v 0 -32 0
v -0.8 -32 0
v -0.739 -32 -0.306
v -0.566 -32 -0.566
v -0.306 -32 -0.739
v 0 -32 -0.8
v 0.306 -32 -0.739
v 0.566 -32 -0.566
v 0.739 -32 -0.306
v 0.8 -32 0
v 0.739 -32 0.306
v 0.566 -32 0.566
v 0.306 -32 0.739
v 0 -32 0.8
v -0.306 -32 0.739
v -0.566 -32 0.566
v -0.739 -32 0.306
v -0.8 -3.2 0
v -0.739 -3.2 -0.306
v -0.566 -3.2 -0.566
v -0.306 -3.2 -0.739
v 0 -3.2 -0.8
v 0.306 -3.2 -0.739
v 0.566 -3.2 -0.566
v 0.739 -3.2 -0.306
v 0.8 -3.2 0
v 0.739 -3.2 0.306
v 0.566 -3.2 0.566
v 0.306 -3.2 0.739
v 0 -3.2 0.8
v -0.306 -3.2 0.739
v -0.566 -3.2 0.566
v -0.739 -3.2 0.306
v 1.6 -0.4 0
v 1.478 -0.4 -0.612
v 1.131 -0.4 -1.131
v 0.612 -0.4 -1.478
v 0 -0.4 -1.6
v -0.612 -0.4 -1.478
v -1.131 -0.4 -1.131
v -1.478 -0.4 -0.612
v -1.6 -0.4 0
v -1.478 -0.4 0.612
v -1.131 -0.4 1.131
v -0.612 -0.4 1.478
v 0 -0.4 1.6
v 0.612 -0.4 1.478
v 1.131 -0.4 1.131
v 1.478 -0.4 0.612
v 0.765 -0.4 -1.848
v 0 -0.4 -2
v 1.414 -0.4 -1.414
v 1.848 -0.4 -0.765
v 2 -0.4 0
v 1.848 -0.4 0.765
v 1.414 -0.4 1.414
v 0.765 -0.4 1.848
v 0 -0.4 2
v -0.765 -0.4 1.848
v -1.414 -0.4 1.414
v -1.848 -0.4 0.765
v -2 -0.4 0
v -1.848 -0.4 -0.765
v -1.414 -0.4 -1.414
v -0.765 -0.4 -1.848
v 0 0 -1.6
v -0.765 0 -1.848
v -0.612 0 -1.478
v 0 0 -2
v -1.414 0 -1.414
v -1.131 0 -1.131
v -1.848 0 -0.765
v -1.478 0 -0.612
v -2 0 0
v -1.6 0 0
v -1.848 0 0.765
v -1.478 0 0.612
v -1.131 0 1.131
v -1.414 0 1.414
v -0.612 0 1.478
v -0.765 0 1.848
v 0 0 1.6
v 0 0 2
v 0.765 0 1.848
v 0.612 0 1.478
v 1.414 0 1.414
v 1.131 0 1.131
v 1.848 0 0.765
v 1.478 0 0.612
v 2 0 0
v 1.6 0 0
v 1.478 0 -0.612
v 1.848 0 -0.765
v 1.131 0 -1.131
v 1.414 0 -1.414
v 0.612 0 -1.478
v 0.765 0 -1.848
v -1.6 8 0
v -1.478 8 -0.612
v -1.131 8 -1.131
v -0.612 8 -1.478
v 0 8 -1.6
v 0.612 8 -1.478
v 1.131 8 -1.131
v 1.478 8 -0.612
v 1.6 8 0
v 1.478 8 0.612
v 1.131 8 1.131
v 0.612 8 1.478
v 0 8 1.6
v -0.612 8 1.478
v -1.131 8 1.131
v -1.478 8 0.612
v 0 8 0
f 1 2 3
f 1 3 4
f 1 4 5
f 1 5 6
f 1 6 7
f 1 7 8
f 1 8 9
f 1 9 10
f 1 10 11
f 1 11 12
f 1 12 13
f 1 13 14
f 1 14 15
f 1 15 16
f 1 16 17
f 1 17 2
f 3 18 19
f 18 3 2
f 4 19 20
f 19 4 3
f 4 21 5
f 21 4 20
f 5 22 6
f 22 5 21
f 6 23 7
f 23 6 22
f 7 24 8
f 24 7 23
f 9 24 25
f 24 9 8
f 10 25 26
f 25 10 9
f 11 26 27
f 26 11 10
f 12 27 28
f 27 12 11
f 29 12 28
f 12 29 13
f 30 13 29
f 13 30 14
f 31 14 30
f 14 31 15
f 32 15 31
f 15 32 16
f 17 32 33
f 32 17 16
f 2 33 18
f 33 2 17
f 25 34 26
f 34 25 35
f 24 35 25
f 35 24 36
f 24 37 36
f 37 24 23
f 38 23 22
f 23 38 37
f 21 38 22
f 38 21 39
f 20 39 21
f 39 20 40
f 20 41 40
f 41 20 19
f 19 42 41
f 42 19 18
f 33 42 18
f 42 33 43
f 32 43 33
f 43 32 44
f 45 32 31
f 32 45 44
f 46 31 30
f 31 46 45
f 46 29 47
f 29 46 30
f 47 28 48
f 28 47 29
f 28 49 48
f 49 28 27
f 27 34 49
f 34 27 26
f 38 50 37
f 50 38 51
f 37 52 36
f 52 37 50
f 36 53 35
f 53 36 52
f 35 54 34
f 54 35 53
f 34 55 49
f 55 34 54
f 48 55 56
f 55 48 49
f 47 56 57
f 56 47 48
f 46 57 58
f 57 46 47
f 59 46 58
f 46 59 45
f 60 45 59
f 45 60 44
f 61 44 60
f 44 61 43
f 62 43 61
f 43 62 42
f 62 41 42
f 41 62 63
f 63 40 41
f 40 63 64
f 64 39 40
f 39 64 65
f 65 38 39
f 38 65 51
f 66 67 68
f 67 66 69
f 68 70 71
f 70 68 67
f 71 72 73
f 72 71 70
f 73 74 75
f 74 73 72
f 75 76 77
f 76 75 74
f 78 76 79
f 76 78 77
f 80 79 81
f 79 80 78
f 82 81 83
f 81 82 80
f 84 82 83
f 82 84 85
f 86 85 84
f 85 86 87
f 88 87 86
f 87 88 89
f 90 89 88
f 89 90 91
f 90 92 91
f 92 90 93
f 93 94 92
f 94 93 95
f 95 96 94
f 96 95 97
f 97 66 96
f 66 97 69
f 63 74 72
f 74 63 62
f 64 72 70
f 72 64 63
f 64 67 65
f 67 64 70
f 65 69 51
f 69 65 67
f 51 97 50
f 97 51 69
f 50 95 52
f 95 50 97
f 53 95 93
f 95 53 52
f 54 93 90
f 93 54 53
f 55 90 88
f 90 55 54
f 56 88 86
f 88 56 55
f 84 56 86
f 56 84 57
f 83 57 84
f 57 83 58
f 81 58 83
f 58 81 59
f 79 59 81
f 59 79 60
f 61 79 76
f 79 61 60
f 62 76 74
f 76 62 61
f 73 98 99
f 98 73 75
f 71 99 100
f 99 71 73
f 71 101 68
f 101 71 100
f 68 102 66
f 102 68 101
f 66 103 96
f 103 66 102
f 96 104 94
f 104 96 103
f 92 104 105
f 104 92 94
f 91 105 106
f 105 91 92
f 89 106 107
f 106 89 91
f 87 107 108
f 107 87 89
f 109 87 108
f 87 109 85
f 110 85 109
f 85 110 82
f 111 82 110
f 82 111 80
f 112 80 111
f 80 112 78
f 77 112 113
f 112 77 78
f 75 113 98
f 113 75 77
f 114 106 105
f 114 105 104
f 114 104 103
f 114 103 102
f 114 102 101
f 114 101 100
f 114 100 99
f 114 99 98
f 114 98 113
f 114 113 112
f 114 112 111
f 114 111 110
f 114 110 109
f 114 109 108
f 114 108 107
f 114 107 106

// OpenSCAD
// file: ../p/4-4ring4.scad
use <../lib.scad>
function ldraw_lib__4_4ring4() = [
// 0 Ring  4 x 1.0
// 0 Name: 4-4ring4.dat
// 0 Author: James Jessiman
// 0 !LDRAW_ORG Primitive UPDATE 2009-01
// 0 !LICENSE Licensed under CC BY 2.0 and CC BY 4.0 : see CAreadme.txt
// 
// 0 BFC CERTIFY CCW
  [0,"BFC","CERTIFY"],
  [0,"BFC","CCW"],
// 
// 0 !HISTORY 1998-12-15 [PTadmin] Official Update 1998-10
// 0 !HISTORY 2002-04-08 [BrickCaster] Modified for BFC compliance
// 0 !HISTORY 2002-04-25 [PTadmin] Official Update 2002-02
// 0 !HISTORY 2007-06-24 [PTadmin] Header formatted for Contributor Agreement
// 0 !HISTORY 2008-07-01 [PTadmin] Official Update 2008-01
// 0 !HISTORY 2008-08-26 [cwdee] Switch polygon winding and rename
// 0 !HISTORY 2009-05-02 [PTadmin] Official Update 2009-01
// 
// 
// 4 16 -1.9135 0 4.6195 -1.5308 0 3.6956 0 0 4 0 0 5
  [4,16,-1.9135,0,4.6195,-1.5308,0,3.6956,0,0,4,0,0,5],
// 4 16 -3.5355 0 3.5355 -2.8284 0 2.8284 -1.5308 0 3.6956 -1.9135 0 4.6195
  [4,16,-3.5355,0,3.5355,-2.8284,0,2.8284,-1.5308,0,3.6956,-1.9135,0,4.6195],
// 4 16 -4.6195 0 1.9135 -3.6956 0 1.5308 -2.8284 0 2.8284 -3.5355 0 3.5355
  [4,16,-4.6195,0,1.9135,-3.6956,0,1.5308,-2.8284,0,2.8284,-3.5355,0,3.5355],
// 4 16 -5 0 0 -4 0 0 -3.6956 0 1.5308 -4.6195 0 1.9135
  [4,16,-5,0,0,-4,0,0,-3.6956,0,1.5308,-4.6195,0,1.9135],
// 4 16 -4.6195 0 -1.9135 -3.6956 0 -1.5308 -4 0 0 -5 0 0
  [4,16,-4.6195,0,-1.9135,-3.6956,0,-1.5308,-4,0,0,-5,0,0],
// 4 16 -3.5355 0 -3.5355 -2.8284 0 -2.8284 -3.6956 0 -1.5308 -4.6195 0 -1.9135
  [4,16,-3.5355,0,-3.5355,-2.8284,0,-2.8284,-3.6956,0,-1.5308,-4.6195,0,-1.9135],
// 4 16 -1.9135 0 -4.6195 -1.5308 0 -3.6956 -2.8284 0 -2.8284 -3.5355 0 -3.5355
  [4,16,-1.9135,0,-4.6195,-1.5308,0,-3.6956,-2.8284,0,-2.8284,-3.5355,0,-3.5355],
// 4 16 0 0 -5 0 0 -4 -1.5308 0 -3.6956 -1.9135 0 -4.6195
  [4,16,0,0,-5,0,0,-4,-1.5308,0,-3.6956,-1.9135,0,-4.6195],
// 4 16 1.9135 0 -4.6195 1.5308 0 -3.6956 0 0 -4 0 0 -5
  [4,16,1.9135,0,-4.6195,1.5308,0,-3.6956,0,0,-4,0,0,-5],
// 4 16 3.5355 0 -3.5355 2.8284 0 -2.8284 1.5308 0 -3.6956 1.9135 0 -4.6195
  [4,16,3.5355,0,-3.5355,2.8284,0,-2.8284,1.5308,0,-3.6956,1.9135,0,-4.6195],
// 4 16 4.6195 0 -1.9135 3.6956 0 -1.5308 2.8284 0 -2.8284 3.5355 0 -3.5355
  [4,16,4.6195,0,-1.9135,3.6956,0,-1.5308,2.8284,0,-2.8284,3.5355,0,-3.5355],
// 4 16 5 0 0 4 0 0 3.6956 0 -1.5308 4.6195 0 -1.9135
  [4,16,5,0,0,4,0,0,3.6956,0,-1.5308,4.6195,0,-1.9135],
// 4 16 4.6195 0 1.9135 3.6956 0 1.5308 4 0 0 5 0 0
  [4,16,4.6195,0,1.9135,3.6956,0,1.5308,4,0,0,5,0,0],
// 4 16 3.5355 0 3.5355 2.8284 0 2.8284 3.6956 0 1.5308 4.6195 0 1.9135
  [4,16,3.5355,0,3.5355,2.8284,0,2.8284,3.6956,0,1.5308,4.6195,0,1.9135],
// 4 16 1.9135 0 4.6195 1.5308 0 3.6956 2.8284 0 2.8284 3.5355 0 3.5355
  [4,16,1.9135,0,4.6195,1.5308,0,3.6956,2.8284,0,2.8284,3.5355,0,3.5355],
// 4 16 0 0 5 0 0 4 1.5308 0 3.6956 1.9135 0 4.6195
  [4,16,0,0,5,0,0,4,1.5308,0,3.6956,1.9135,0,4.6195],
// 0
];
makepoly(ldraw_lib__4_4ring4(), line=0.2);
// file: ../p/4-4edge.scad
use <../lib.scad>
function ldraw_lib__4_4edge() = [
// 0 Circle 1.0
// 0 Name: 4-4edge.dat
// 0 Author: James Jessiman
// 0 !LDRAW_ORG Primitive UPDATE 2017-01
// 0 !LICENSE Licensed under CC BY 2.0 and CC BY 4.0 : see CAreadme.txt
// 
// 0 BFC CERTIFY CCW
  [0,"BFC","CERTIFY"],
  [0,"BFC","CCW"],
// 
// 0 !HISTORY 1998-12-15 [PTadmin] Official Update 1998-10
// 0 !HISTORY 2005-12-28 [PTadmin] Official Update 2005-01
// 0 !HISTORY 2007-06-24 [PTadmin] Header formatted for Contributor Agreement
// 0 !HISTORY 2008-07-01 [PTadmin] Official Update 2008-01
// 0 !HISTORY 2017-01-15 [Steffen] BFCed
// 0 !HISTORY 2017-12-30 [PTadmin] Official Update 2017-01
// 
// 
// 2 24 1 0 0 0.9239 0 0.3827
  [2,24,1,0,0,0.9239,0,0.3827],
// 2 24 0.9239 0 0.3827 0.7071 0 0.7071
  [2,24,0.9239,0,0.3827,0.7071,0,0.7071],
// 2 24 0.7071 0 0.7071 0.3827 0 0.9239
  [2,24,0.7071,0,0.7071,0.3827,0,0.9239],
// 2 24 0.3827 0 0.9239 0 0 1
  [2,24,0.3827,0,0.9239,0,0,1],
// 2 24 0 0 1 -0.3827 0 0.9239
  [2,24,0,0,1,-0.3827,0,0.9239],
// 2 24 -0.3827 0 0.9239 -0.7071 0 0.7071
  [2,24,-0.3827,0,0.9239,-0.7071,0,0.7071],
// 2 24 -0.7071 0 0.7071 -0.9239 0 0.3827
  [2,24,-0.7071,0,0.7071,-0.9239,0,0.3827],
// 2 24 -0.9239 0 0.3827 -1 0 -0
  [2,24,-0.9239,0,0.3827,-1,0,-0],
// 2 24 -1 0 -0 -0.9239 0 -0.3827
  [2,24,-1,0,-0,-0.9239,0,-0.3827],
// 2 24 -0.9239 0 -0.3827 -0.7071 0 -0.7071
  [2,24,-0.9239,0,-0.3827,-0.7071,0,-0.7071],
// 2 24 -0.7071 0 -0.7071 -0.3827 0 -0.9239
  [2,24,-0.7071,0,-0.7071,-0.3827,0,-0.9239],
// 2 24 -0.3827 0 -0.9239 0 0 -1
  [2,24,-0.3827,0,-0.9239,0,0,-1],
// 2 24 0 0 -1 0.3827 0 -0.9239
  [2,24,0,0,-1,0.3827,0,-0.9239],
// 2 24 0.3827 0 -0.9239 0.7071 0 -0.7071
  [2,24,0.3827,0,-0.9239,0.7071,0,-0.7071],
// 2 24 0.7071 0 -0.7071 0.9239 0 -0.3827
  [2,24,0.7071,0,-0.7071,0.9239,0,-0.3827],
// 2 24 0.9239 0 -0.3827 1 0 0
  [2,24,0.9239,0,-0.3827,1,0,0],
];
makepoly(ldraw_lib__4_4edge(), line=0.2);
// file: ../p/4-4disc.scad
use <../lib.scad>
function ldraw_lib__4_4disc() = [
// 0 Disc 1.0
// 0 Name: 4-4disc.dat
// 0 Author: James Jessiman
// 0 !LDRAW_ORG Primitive UPDATE 2002-02
// 0 !LICENSE Licensed under CC BY 2.0 and CC BY 4.0 : see CAreadme.txt
// 
// 0 BFC CERTIFY CCW
  [0,"BFC","CERTIFY"],
  [0,"BFC","CCW"],
// 
// 0 !HISTORY 1998-12-15 [PTadmin] Official Update 1998-10
// 0 !HISTORY 2002-03-23 [sbliss] Added BFC statement
// 0 !HISTORY 2002-04-25 [PTadmin] Official Update 2002-02
// 0 !HISTORY 2007-06-24 [PTadmin] Header formatted for Contributor Agreement
// 0 !HISTORY 2008-07-01 [PTadmin] Official Update 2008-01
// 
// 
// 3 16 0 0 0 1 0 0 0.9239 0 0.3827
  [3,16,0,0,0,1,0,0,0.9239,0,0.3827],
// 3 16 0 0 0 0.9239 0 0.3827 0.7071 0 0.7071
  [3,16,0,0,0,0.9239,0,0.3827,0.7071,0,0.7071],
// 3 16 0 0 0 0.7071 0 0.7071 0.3827 0 0.9239
  [3,16,0,0,0,0.7071,0,0.7071,0.3827,0,0.9239],
// 3 16 0 0 0 0.3827 0 0.9239 0 0 1
  [3,16,0,0,0,0.3827,0,0.9239,0,0,1],
// 3 16 0 0 0 0 0 1 -0.3827 0 0.9239
  [3,16,0,0,0,0,0,1,-0.3827,0,0.9239],
// 3 16 0 0 0 -0.3827 0 0.9239 -0.7071 0 0.7071
  [3,16,0,0,0,-0.3827,0,0.9239,-0.7071,0,0.7071],
// 3 16 0 0 0 -0.7071 0 0.7071 -0.9239 0 0.3827
  [3,16,0,0,0,-0.7071,0,0.7071,-0.9239,0,0.3827],
// 3 16 0 0 0 -0.9239 0 0.3827 -1 0 -0
  [3,16,0,0,0,-0.9239,0,0.3827,-1,0,-0],
// 3 16 0 0 0 -1 0 -0 -0.9239 0 -0.3827
  [3,16,0,0,0,-1,0,-0,-0.9239,0,-0.3827],
// 3 16 0 0 0 -0.9239 0 -0.3827 -0.7071 0 -0.7071
  [3,16,0,0,0,-0.9239,0,-0.3827,-0.7071,0,-0.7071],
// 3 16 0 0 0 -0.7071 0 -0.7071 -0.3827 0 -0.9239
  [3,16,0,0,0,-0.7071,0,-0.7071,-0.3827,0,-0.9239],
// 3 16 0 0 0 -0.3827 0 -0.9239 0 0 -1
  [3,16,0,0,0,-0.3827,0,-0.9239,0,0,-1],
// 3 16 0 0 0 0 0 -1 0.3827 0 -0.9239
  [3,16,0,0,0,0,0,-1,0.3827,0,-0.9239],
// 3 16 0 0 0 0.3827 0 -0.9239 0.7071 0 -0.7071
  [3,16,0,0,0,0.3827,0,-0.9239,0.7071,0,-0.7071],
// 3 16 0 0 0 0.7071 0 -0.7071 0.9239 0 -0.3827
  [3,16,0,0,0,0.7071,0,-0.7071,0.9239,0,-0.3827],
// 3 16 0 0 0 0.9239 0 -0.3827 1 0 0
  [3,16,0,0,0,0.9239,0,-0.3827,1,0,0],
// 0
];
makepoly(ldraw_lib__4_4disc(), line=0.2);
// file: ../p/4-4cyli.scad
use <../lib.scad>
function ldraw_lib__4_4cyli() = [
// 0 Cylinder 1.0
// 0 Name: 4-4cyli.dat
// 0 Author: James Jessiman
// 0 !LDRAW_ORG Primitive UPDATE 2005-01
// 0 !LICENSE Licensed under CC BY 2.0 and CC BY 4.0 : see CAreadme.txt
// 
// 0 BFC CERTIFY CCW
  [0,"BFC","CERTIFY"],
  [0,"BFC","CCW"],
// 
// 0 !HISTORY 1998-12-15 [PTadmin] Official Update 1998-10
// 0 !HISTORY 2002-03-23 [sbliss] Added BFC statement; merged headers from files in distributions LDraw 0.27 and Complete.
// 0 !HISTORY 2002-04-25 [PTadmin] Official Update 2002-02
// 0 !HISTORY 2004-12-14 [guyvivan] BFC CCW
// 0 !HISTORY 2005-12-28 [PTadmin] Official Update 2005-01
// 0 !HISTORY 2007-06-24 [PTadmin] Header formatted for Contributor Agreement
// 0 !HISTORY 2008-07-01 [PTadmin] Official Update 2008-01
// 
// 
// 4 16 1 1 0 0.9239 1 0.3827 0.9239 0 0.3827 1 0 0
  [4,16,1,1,0,0.9239,1,0.3827,0.9239,0,0.3827,1,0,0],
// 5 24 1 0 0 1 1 0 0.9239 0 0.3827 0.9239 0 -0.3827
  [5,24,1,0,0,1,1,0,0.9239,0,0.3827,0.9239,0,-0.3827],
// 4 16 0.9239 1 0.3827 0.7071 1 0.7071 0.7071 0 0.7071 0.9239 0 0.3827
  [4,16,0.9239,1,0.3827,0.7071,1,0.7071,0.7071,0,0.7071,0.9239,0,0.3827],
// 5 24 0.9239 0 0.3827 0.9239 1 0.3827 0.7071 0 0.7071 1 0 0
  [5,24,0.9239,0,0.3827,0.9239,1,0.3827,0.7071,0,0.7071,1,0,0],
// 4 16 0.7071 1 0.7071 0.3827 1 0.9239 0.3827 0 0.9239 0.7071 0 0.7071
  [4,16,0.7071,1,0.7071,0.3827,1,0.9239,0.3827,0,0.9239,0.7071,0,0.7071],
// 5 24 0.7071 0 0.7071 0.7071 1 0.7071 0.3827 0 0.9239 0.9239 0 0.3827
  [5,24,0.7071,0,0.7071,0.7071,1,0.7071,0.3827,0,0.9239,0.9239,0,0.3827],
// 4 16 0.3827 1 0.9239 0 1 1 0 0 1 0.3827 0 0.9239
  [4,16,0.3827,1,0.9239,0,1,1,0,0,1,0.3827,0,0.9239],
// 5 24 0.3827 0 0.9239 0.3827 1 0.9239 0 0 1 0.7071 0 0.7071
  [5,24,0.3827,0,0.9239,0.3827,1,0.9239,0,0,1,0.7071,0,0.7071],
// 4 16 0 1 1 -0.3827 1 0.9239 -0.3827 0 0.9239 0 0 1
  [4,16,0,1,1,-0.3827,1,0.9239,-0.3827,0,0.9239,0,0,1],
// 5 24 0 0 1 0 1 1 -0.3827 0 0.9239 0.3827 0 0.9239
  [5,24,0,0,1,0,1,1,-0.3827,0,0.9239,0.3827,0,0.9239],
// 4 16 -0.3827 1 0.9239 -0.7071 1 0.7071 -0.7071 0 0.7071 -0.3827 0 0.9239
  [4,16,-0.3827,1,0.9239,-0.7071,1,0.7071,-0.7071,0,0.7071,-0.3827,0,0.9239],
// 5 24 -0.3827 0 0.9239 -0.3827 1 0.9239 -0.7071 0 0.7071 0 0 1
  [5,24,-0.3827,0,0.9239,-0.3827,1,0.9239,-0.7071,0,0.7071,0,0,1],
// 4 16 -0.7071 1 0.7071 -0.9239 1 0.3827 -0.9239 0 0.3827 -0.7071 0 0.7071
  [4,16,-0.7071,1,0.7071,-0.9239,1,0.3827,-0.9239,0,0.3827,-0.7071,0,0.7071],
// 5 24 -0.7071 0 0.7071 -0.7071 1 0.7071 -0.9239 0 0.3827 -0.3827 0 0.9239
  [5,24,-0.7071,0,0.7071,-0.7071,1,0.7071,-0.9239,0,0.3827,-0.3827,0,0.9239],
// 4 16 -0.9239 1 0.3827 -1 1 0 -1 0 0 -0.9239 0 0.3827
  [4,16,-0.9239,1,0.3827,-1,1,0,-1,0,0,-0.9239,0,0.3827],
// 5 24 -0.9239 0 0.3827 -0.9239 1 0.3827 -1 0 0 -0.7071 0 0.7071
  [5,24,-0.9239,0,0.3827,-0.9239,1,0.3827,-1,0,0,-0.7071,0,0.7071],
// 4 16 -1 1 0 -0.9239 1 -0.3827 -0.9239 0 -0.3827 -1 0 0
  [4,16,-1,1,0,-0.9239,1,-0.3827,-0.9239,0,-0.3827,-1,0,0],
// 5 24 -1 0 0 -1 1 0 -0.9239 0 -0.3827 -0.9239 0 0.3827
  [5,24,-1,0,0,-1,1,0,-0.9239,0,-0.3827,-0.9239,0,0.3827],
// 4 16 -0.9239 1 -0.3827 -0.7071 1 -0.7071 -0.7071 0 -0.7071 -0.9239 0 -0.3827
  [4,16,-0.9239,1,-0.3827,-0.7071,1,-0.7071,-0.7071,0,-0.7071,-0.9239,0,-0.3827],
// 5 24 -0.9239 0 -0.3827 -0.9239 1 -0.3827 -0.7071 0 -0.7071 -1 0 0
  [5,24,-0.9239,0,-0.3827,-0.9239,1,-0.3827,-0.7071,0,-0.7071,-1,0,0],
// 4 16 -0.7071 1 -0.7071 -0.3827 1 -0.9239 -0.3827 0 -0.9239 -0.7071 0 -0.7071
  [4,16,-0.7071,1,-0.7071,-0.3827,1,-0.9239,-0.3827,0,-0.9239,-0.7071,0,-0.7071],
// 5 24 -0.7071 0 -0.7071 -0.7071 1 -0.7071 -0.3827 0 -0.9239 -0.9239 0 -0.3827
  [5,24,-0.7071,0,-0.7071,-0.7071,1,-0.7071,-0.3827,0,-0.9239,-0.9239,0,-0.3827],
// 4 16 -0.3827 1 -0.9239 0 1 -1 0 0 -1 -0.3827 0 -0.9239
  [4,16,-0.3827,1,-0.9239,0,1,-1,0,0,-1,-0.3827,0,-0.9239],
// 5 24 -0.3827 0 -0.9239 -0.3827 1 -0.9239 0 0 -1 -0.7071 0 -0.7071
  [5,24,-0.3827,0,-0.9239,-0.3827,1,-0.9239,0,0,-1,-0.7071,0,-0.7071],
// 4 16 0 1 -1 0.3827 1 -0.9239 0.3827 0 -0.9239 0 0 -1
  [4,16,0,1,-1,0.3827,1,-0.9239,0.3827,0,-0.9239,0,0,-1],
// 5 24 0 0 -1 0 1 -1 0.3827 0 -0.9239 -0.3827 0 -0.9239
  [5,24,0,0,-1,0,1,-1,0.3827,0,-0.9239,-0.3827,0,-0.9239],
// 4 16 0.3827 1 -0.9239 0.7071 1 -0.7071 0.7071 0 -0.7071 0.3827 0 -0.9239
  [4,16,0.3827,1,-0.9239,0.7071,1,-0.7071,0.7071,0,-0.7071,0.3827,0,-0.9239],
// 5 24 0.3827 0 -0.9239 0.3827 1 -0.9239 0.7071 0 -0.7071 0 0 -1
  [5,24,0.3827,0,-0.9239,0.3827,1,-0.9239,0.7071,0,-0.7071,0,0,-1],
// 4 16 0.7071 1 -0.7071 0.9239 1 -0.3827 0.9239 0 -0.3827 0.7071 0 -0.7071
  [4,16,0.7071,1,-0.7071,0.9239,1,-0.3827,0.9239,0,-0.3827,0.7071,0,-0.7071],
// 5 24 0.7071 0 -0.7071 0.7071 1 -0.7071 0.9239 0 -0.3827 0.3827 0 -0.9239
  [5,24,0.7071,0,-0.7071,0.7071,1,-0.7071,0.9239,0,-0.3827,0.3827,0,-0.9239],
// 4 16 0.9239 1 -0.3827 1 1 0 1 0 0 0.9239 0 -0.3827
  [4,16,0.9239,1,-0.3827,1,1,0,1,0,0,0.9239,0,-0.3827],
// 5 24 0.9239 0 -0.3827 0.9239 1 -0.3827 1 0 0 0.7071 0 -0.7071
  [5,24,0.9239,0,-0.3827,0.9239,1,-0.3827,1,0,0,0.7071,0,-0.7071],
// 0
];
makepoly(ldraw_lib__4_4cyli(), line=0.2);
// file: ../p/4-4con1.scad
use <../lib.scad>
function ldraw_lib__4_4con1() = [
// 0 Cone  1 x 1.0
// 0 Name: 4-4con1.dat
// 0 Author: Steve Bliss [sbliss]
// 0 !LDRAW_ORG Primitive UPDATE 2012-01
// 0 !LICENSE Licensed under CC BY 2.0 and CC BY 4.0 : see CAreadme.txt
// 
// 0 BFC CERTIFY CCW
  [0,"BFC","CERTIFY"],
  [0,"BFC","CCW"],
// 
// 0 !HISTORY 1999-08-19 [sbliss] Renamed 4-4con12.dat to 4-4con1.dat, Moved all conditional lines before quads
// 0 !HISTORY 2000-05-07 [PTadmin] Official Update 2000-01
// 0 !HISTORY 2002-12-11 [cwdee] Standardised title and made BFC compliant
// 0 !HISTORY 2003-08-01 [PTadmin] Official Update 2003-02
// 0 !HISTORY 2007-06-24 [PTadmin] Header formatted for Contributor Agreement
// 0 !HISTORY 2008-07-01 [PTadmin] Official Update 2008-01
// 0 !HISTORY 2012-02-16 [Philo] Changed to CCW, reordered
// 0 !HISTORY 2012-03-30 [PTadmin] Official Update 2012-01
// 
// 
// 5 24 1 1 0 2 0 0 0.9239 1 -0.3827 0.9239 1 0.3827
  [5,24,1,1,0,2,0,0,0.9239,1,-0.3827,0.9239,1,0.3827],
// 5 24 0.9239 1 0.3827 1.8478 0 0.7654 1 1 0 0.7071 1 0.7071
  [5,24,0.9239,1,0.3827,1.8478,0,0.7654,1,1,0,0.7071,1,0.7071],
// 5 24 0.7071 1 0.7071 1.4142 0 1.4142 0.9239 1 0.3827 0.3827 1 0.9239
  [5,24,0.7071,1,0.7071,1.4142,0,1.4142,0.9239,1,0.3827,0.3827,1,0.9239],
// 5 24 0.3827 1 0.9239 0.7654 0 1.8478 0.7071 1 0.7071 0 1 1
  [5,24,0.3827,1,0.9239,0.7654,0,1.8478,0.7071,1,0.7071,0,1,1],
// 5 24 0 1 1 0 0 2 0.3827 1 0.9239 -0.3827 1 0.9239
  [5,24,0,1,1,0,0,2,0.3827,1,0.9239,-0.3827,1,0.9239],
// 5 24 -0.3827 1 0.9239 -0.7654 0 1.8478 0 1 1 -0.7071 1 0.7071
  [5,24,-0.3827,1,0.9239,-0.7654,0,1.8478,0,1,1,-0.7071,1,0.7071],
// 5 24 -0.7071 1 0.7071 -1.4142 0 1.4142 -0.3827 1 0.9239 -0.9239 1 0.3827
  [5,24,-0.7071,1,0.7071,-1.4142,0,1.4142,-0.3827,1,0.9239,-0.9239,1,0.3827],
// 5 24 -0.9239 1 0.3827 -1.8478 0 0.7654 -0.7071 1 0.7071 -1 1 0
  [5,24,-0.9239,1,0.3827,-1.8478,0,0.7654,-0.7071,1,0.7071,-1,1,0],
// 5 24 -1 1 0 -2 0 0 -0.9239 1 0.3827 -0.9239 1 -0.3827
  [5,24,-1,1,0,-2,0,0,-0.9239,1,0.3827,-0.9239,1,-0.3827],
// 5 24 -0.9239 1 -0.3827 -1.8478 0 -0.7654 -1 1 0 -0.7071 1 -0.7071
  [5,24,-0.9239,1,-0.3827,-1.8478,0,-0.7654,-1,1,0,-0.7071,1,-0.7071],
// 5 24 -0.7071 1 -0.7071 -1.4142 0 -1.4142 -0.9239 1 -0.3827 -0.3827 1 -0.9239
  [5,24,-0.7071,1,-0.7071,-1.4142,0,-1.4142,-0.9239,1,-0.3827,-0.3827,1,-0.9239],
// 5 24 -0.3827 1 -0.9239 -0.7654 0 -1.8478 -0.7071 1 -0.7071 0 1 -1
  [5,24,-0.3827,1,-0.9239,-0.7654,0,-1.8478,-0.7071,1,-0.7071,0,1,-1],
// 5 24 0 1 -1 0 0 -2 -0.3827 1 -0.9239 0.3827 1 -0.9239
  [5,24,0,1,-1,0,0,-2,-0.3827,1,-0.9239,0.3827,1,-0.9239],
// 5 24 0.3827 1 -0.9239 0.7654 0 -1.8478 0 1 -1 0.7071 1 -0.7071
  [5,24,0.3827,1,-0.9239,0.7654,0,-1.8478,0,1,-1,0.7071,1,-0.7071],
// 5 24 0.7071 1 -0.7071 1.4142 0 -1.4142 0.3827 1 -0.9239 0.9239 1 -0.3827
  [5,24,0.7071,1,-0.7071,1.4142,0,-1.4142,0.3827,1,-0.9239,0.9239,1,-0.3827],
// 5 24 0.9239 1 -0.3827 1.8478 0 -0.7654 0.7071 1 -0.7071 1 1 0
  [5,24,0.9239,1,-0.3827,1.8478,0,-0.7654,0.7071,1,-0.7071,1,1,0],
// 
// 4 16 2 0 0 1 1 0 0.9239 1 0.3827 1.8478 0 0.7654
  [4,16,2,0,0,1,1,0,0.9239,1,0.3827,1.8478,0,0.7654],
// 4 16 1.8478 0 0.7654 0.9239 1 0.3827 0.7071 1 0.7071 1.4142 0 1.4142
  [4,16,1.8478,0,0.7654,0.9239,1,0.3827,0.7071,1,0.7071,1.4142,0,1.4142],
// 4 16 1.4142 0 1.4142 0.7071 1 0.7071 0.3827 1 0.9239 0.7654 0 1.8478
  [4,16,1.4142,0,1.4142,0.7071,1,0.7071,0.3827,1,0.9239,0.7654,0,1.8478],
// 4 16 0.7654 0 1.8478 0.3827 1 0.9239 0 1 1 0 0 2
  [4,16,0.7654,0,1.8478,0.3827,1,0.9239,0,1,1,0,0,2],
// 4 16 0 0 2 0 1 1 -0.3827 1 0.9239 -0.7654 0 1.8478
  [4,16,0,0,2,0,1,1,-0.3827,1,0.9239,-0.7654,0,1.8478],
// 4 16 -0.7654 0 1.8478 -0.3827 1 0.9239 -0.7071 1 0.7071 -1.4142 0 1.4142
  [4,16,-0.7654,0,1.8478,-0.3827,1,0.9239,-0.7071,1,0.7071,-1.4142,0,1.4142],
// 4 16 -1.4142 0 1.4142 -0.7071 1 0.7071 -0.9239 1 0.3827 -1.8478 0 0.7654
  [4,16,-1.4142,0,1.4142,-0.7071,1,0.7071,-0.9239,1,0.3827,-1.8478,0,0.7654],
// 4 16 -1.8478 0 0.7654 -0.9239 1 0.3827 -1 1 0 -2 0 0
  [4,16,-1.8478,0,0.7654,-0.9239,1,0.3827,-1,1,0,-2,0,0],
// 4 16 -2 0 0 -1 1 0 -0.9239 1 -0.3827 -1.8478 0 -0.7654
  [4,16,-2,0,0,-1,1,0,-0.9239,1,-0.3827,-1.8478,0,-0.7654],
// 4 16 -1.8478 0 -0.7654 -0.9239 1 -0.3827 -0.7071 1 -0.7071 -1.4142 0 -1.4142
  [4,16,-1.8478,0,-0.7654,-0.9239,1,-0.3827,-0.7071,1,-0.7071,-1.4142,0,-1.4142],
// 4 16 -1.4142 0 -1.4142 -0.7071 1 -0.7071 -0.3827 1 -0.9239 -0.7654 0 -1.8478
  [4,16,-1.4142,0,-1.4142,-0.7071,1,-0.7071,-0.3827,1,-0.9239,-0.7654,0,-1.8478],
// 4 16 -0.7654 0 -1.8478 -0.3827 1 -0.9239 0 1 -1 0 0 -2
  [4,16,-0.7654,0,-1.8478,-0.3827,1,-0.9239,0,1,-1,0,0,-2],
// 4 16 0 0 -2 0 1 -1 0.3827 1 -0.9239 0.7654 0 -1.8478
  [4,16,0,0,-2,0,1,-1,0.3827,1,-0.9239,0.7654,0,-1.8478],
// 4 16 0.7654 0 -1.8478 0.3827 1 -0.9239 0.7071 1 -0.7071 1.4142 0 -1.4142
  [4,16,0.7654,0,-1.8478,0.3827,1,-0.9239,0.7071,1,-0.7071,1.4142,0,-1.4142],
// 4 16 1.4142 0 -1.4142 0.7071 1 -0.7071 0.9239 1 -0.3827 1.8478 0 -0.7654
  [4,16,1.4142,0,-1.4142,0.7071,1,-0.7071,0.9239,1,-0.3827,1.8478,0,-0.7654],
// 4 16 1.8478 0 -0.7654 0.9239 1 -0.3827 1 1 0 2 0 0
  [4,16,1.8478,0,-0.7654,0.9239,1,-0.3827,1,1,0,2,0,0],
];
makepoly(ldraw_lib__4_4con1(), line=0.2);
// file: 6640b.scad
use <../lib.scad>
use <../p/4-4con1.scad>
use <../p/4-4cyli.scad>
use <../p/4-4disc.scad>
use <../p/4-4edge.scad>
use <../p/4-4ring4.scad>
function ldraw_lib__6640b() = [
// 0 Electric Technic Fiber Optics Cable  5L
// 0 Name: 6640b.dat
// 0 Author: Michael Heidemann [mikeheide]
// 0 !LDRAW_ORG Part UPDATE 2022-06
// 0 !LICENSE Licensed under CC BY 2.0 and CC BY 4.0 : see CAreadme.txt
// 
// 0 BFC CERTIFY CCW
  [0,"BFC","CERTIFY"],
  [0,"BFC","CCW"],
// 
// 0 !HISTORY 2009-09-03 [PTadmin] Official Update 2009-02
// 0 !HISTORY 2021-03-26 [PTadmin] Renamed from 6640
// 0 !HISTORY 2022-12-20 [PTadmin] Official Update 2022-06
// 
// 
// 1 16 0 0 -80 -2 0 0 0 0 2 0 1 0 4-4edge.dat
  [1,16,0,0,-80,-2,0,0,0,0,2,0,1,0, ldraw_lib__4_4edge()],
// 1 16 0 0 -8 -2 0 0 0 0 2 0 1 0 4-4edge.dat
  [1,16,0,0,-8,-2,0,0,0,0,2,0,1,0, ldraw_lib__4_4edge()],
// 1 16 0 0 -1 -4 0 0 0 0 4 0 1 0 4-4edge.dat
  [1,16,0,0,-1,-4,0,0,0,0,4,0,1,0, ldraw_lib__4_4edge()],
// 1 16 0 0 -1 -5 0 0 0 0 5 0 1 0 4-4edge.dat
  [1,16,0,0,-1,-5,0,0,0,0,5,0,1,0, ldraw_lib__4_4edge()],
// 1 16 0 0 0 -5 0 0 0 0 5 0 1 0 4-4edge.dat
  [1,16,0,0,0,-5,0,0,0,0,5,0,1,0, ldraw_lib__4_4edge()],
// 1 16 0 0 0 -4 0 0 0 0 4 0 1 0 4-4edge.dat
  [1,16,0,0,0,-4,0,0,0,0,4,0,1,0, ldraw_lib__4_4edge()],
// 1 16 0 0 20 -4 0 0 0 0 4 0 1 0 4-4edge.dat
  [1,16,0,0,20,-4,0,0,0,0,4,0,1,0, ldraw_lib__4_4edge()],
// 1 16 0 0 -80 -2 0 0 0 0 2 0 1 0 4-4disc.dat
  [1,16,0,0,-80,-2,0,0,0,0,2,0,1,0, ldraw_lib__4_4disc()],
// 1 16 0 0 -80 -2 0 0 0 0 2 0 72 0 4-4cyli.dat
  [1,16,0,0,-80,-2,0,0,0,0,2,0,72,0, ldraw_lib__4_4cyli()],
// 1 16 0 0 -1 2 0 0 0 0 2 0 -7 0 4-4con1.dat
  [1,16,0,0,-1,2,0,0,0,0,2,0,-7,0, ldraw_lib__4_4con1()],
// 1 16 0 0 -1 -1 0 0 0 0 1 0 1 0 4-4ring4.dat
  [1,16,0,0,-1,-1,0,0,0,0,1,0,1,0, ldraw_lib__4_4ring4()],
// 1 16 0 0 0 1 0 0 0 0 1 0 -1 0 4-4ring4.dat
  [1,16,0,0,0,1,0,0,0,0,1,0,-1,0, ldraw_lib__4_4ring4()],
// 1 16 0 0 -1 -5 0 0 0 0 5 0 1 0 4-4cyli.dat
  [1,16,0,0,-1,-5,0,0,0,0,5,0,1,0, ldraw_lib__4_4cyli()],
// 1 16 0 0 0 -4 0 0 0 0 4 0 20 0 4-4cyli.dat
  [1,16,0,0,0,-4,0,0,0,0,4,0,20,0, ldraw_lib__4_4cyli()],
// 1 16 0 0 20 4 0 0 0 0 4 0 -1 0 4-4disc.dat
  [1,16,0,0,20,4,0,0,0,0,4,0,-1,0, ldraw_lib__4_4disc()],
// 0
];
makepoly(ldraw_lib__6640b(), line=0.2);
// main file
use <../lib.scad>
use <6640b.scad>
function ldraw_lib__6640() = [
// 0 ~Moved to 6640b
// 0 Name: 6640.dat
// 0 Author: [PTadmin]
// 0 !LDRAW_ORG Part UPDATE 2022-06
// 0 !LICENSE Licensed under CC BY 4.0 : see CAreadme.txt
// 
// 0 BFC CERTIFY CCW
  [0,"BFC","CERTIFY"],
  [0,"BFC","CCW"],
// 
// 0 !HISTORY 2022-12-20 [PTadmin] Official Update 2022-06
// 
// 
// 0 // Electric Technic Fiber Optics Cable 5L
// 1 16 0 0 0 1 0 0 0 1 0 0 0 1 6640b.dat
  [1,16,0,0,0,1,0,0,0,1,0,0,0,1, ldraw_lib__6640b()],
];
makepoly(ldraw_lib__6640(), line=0.2);
